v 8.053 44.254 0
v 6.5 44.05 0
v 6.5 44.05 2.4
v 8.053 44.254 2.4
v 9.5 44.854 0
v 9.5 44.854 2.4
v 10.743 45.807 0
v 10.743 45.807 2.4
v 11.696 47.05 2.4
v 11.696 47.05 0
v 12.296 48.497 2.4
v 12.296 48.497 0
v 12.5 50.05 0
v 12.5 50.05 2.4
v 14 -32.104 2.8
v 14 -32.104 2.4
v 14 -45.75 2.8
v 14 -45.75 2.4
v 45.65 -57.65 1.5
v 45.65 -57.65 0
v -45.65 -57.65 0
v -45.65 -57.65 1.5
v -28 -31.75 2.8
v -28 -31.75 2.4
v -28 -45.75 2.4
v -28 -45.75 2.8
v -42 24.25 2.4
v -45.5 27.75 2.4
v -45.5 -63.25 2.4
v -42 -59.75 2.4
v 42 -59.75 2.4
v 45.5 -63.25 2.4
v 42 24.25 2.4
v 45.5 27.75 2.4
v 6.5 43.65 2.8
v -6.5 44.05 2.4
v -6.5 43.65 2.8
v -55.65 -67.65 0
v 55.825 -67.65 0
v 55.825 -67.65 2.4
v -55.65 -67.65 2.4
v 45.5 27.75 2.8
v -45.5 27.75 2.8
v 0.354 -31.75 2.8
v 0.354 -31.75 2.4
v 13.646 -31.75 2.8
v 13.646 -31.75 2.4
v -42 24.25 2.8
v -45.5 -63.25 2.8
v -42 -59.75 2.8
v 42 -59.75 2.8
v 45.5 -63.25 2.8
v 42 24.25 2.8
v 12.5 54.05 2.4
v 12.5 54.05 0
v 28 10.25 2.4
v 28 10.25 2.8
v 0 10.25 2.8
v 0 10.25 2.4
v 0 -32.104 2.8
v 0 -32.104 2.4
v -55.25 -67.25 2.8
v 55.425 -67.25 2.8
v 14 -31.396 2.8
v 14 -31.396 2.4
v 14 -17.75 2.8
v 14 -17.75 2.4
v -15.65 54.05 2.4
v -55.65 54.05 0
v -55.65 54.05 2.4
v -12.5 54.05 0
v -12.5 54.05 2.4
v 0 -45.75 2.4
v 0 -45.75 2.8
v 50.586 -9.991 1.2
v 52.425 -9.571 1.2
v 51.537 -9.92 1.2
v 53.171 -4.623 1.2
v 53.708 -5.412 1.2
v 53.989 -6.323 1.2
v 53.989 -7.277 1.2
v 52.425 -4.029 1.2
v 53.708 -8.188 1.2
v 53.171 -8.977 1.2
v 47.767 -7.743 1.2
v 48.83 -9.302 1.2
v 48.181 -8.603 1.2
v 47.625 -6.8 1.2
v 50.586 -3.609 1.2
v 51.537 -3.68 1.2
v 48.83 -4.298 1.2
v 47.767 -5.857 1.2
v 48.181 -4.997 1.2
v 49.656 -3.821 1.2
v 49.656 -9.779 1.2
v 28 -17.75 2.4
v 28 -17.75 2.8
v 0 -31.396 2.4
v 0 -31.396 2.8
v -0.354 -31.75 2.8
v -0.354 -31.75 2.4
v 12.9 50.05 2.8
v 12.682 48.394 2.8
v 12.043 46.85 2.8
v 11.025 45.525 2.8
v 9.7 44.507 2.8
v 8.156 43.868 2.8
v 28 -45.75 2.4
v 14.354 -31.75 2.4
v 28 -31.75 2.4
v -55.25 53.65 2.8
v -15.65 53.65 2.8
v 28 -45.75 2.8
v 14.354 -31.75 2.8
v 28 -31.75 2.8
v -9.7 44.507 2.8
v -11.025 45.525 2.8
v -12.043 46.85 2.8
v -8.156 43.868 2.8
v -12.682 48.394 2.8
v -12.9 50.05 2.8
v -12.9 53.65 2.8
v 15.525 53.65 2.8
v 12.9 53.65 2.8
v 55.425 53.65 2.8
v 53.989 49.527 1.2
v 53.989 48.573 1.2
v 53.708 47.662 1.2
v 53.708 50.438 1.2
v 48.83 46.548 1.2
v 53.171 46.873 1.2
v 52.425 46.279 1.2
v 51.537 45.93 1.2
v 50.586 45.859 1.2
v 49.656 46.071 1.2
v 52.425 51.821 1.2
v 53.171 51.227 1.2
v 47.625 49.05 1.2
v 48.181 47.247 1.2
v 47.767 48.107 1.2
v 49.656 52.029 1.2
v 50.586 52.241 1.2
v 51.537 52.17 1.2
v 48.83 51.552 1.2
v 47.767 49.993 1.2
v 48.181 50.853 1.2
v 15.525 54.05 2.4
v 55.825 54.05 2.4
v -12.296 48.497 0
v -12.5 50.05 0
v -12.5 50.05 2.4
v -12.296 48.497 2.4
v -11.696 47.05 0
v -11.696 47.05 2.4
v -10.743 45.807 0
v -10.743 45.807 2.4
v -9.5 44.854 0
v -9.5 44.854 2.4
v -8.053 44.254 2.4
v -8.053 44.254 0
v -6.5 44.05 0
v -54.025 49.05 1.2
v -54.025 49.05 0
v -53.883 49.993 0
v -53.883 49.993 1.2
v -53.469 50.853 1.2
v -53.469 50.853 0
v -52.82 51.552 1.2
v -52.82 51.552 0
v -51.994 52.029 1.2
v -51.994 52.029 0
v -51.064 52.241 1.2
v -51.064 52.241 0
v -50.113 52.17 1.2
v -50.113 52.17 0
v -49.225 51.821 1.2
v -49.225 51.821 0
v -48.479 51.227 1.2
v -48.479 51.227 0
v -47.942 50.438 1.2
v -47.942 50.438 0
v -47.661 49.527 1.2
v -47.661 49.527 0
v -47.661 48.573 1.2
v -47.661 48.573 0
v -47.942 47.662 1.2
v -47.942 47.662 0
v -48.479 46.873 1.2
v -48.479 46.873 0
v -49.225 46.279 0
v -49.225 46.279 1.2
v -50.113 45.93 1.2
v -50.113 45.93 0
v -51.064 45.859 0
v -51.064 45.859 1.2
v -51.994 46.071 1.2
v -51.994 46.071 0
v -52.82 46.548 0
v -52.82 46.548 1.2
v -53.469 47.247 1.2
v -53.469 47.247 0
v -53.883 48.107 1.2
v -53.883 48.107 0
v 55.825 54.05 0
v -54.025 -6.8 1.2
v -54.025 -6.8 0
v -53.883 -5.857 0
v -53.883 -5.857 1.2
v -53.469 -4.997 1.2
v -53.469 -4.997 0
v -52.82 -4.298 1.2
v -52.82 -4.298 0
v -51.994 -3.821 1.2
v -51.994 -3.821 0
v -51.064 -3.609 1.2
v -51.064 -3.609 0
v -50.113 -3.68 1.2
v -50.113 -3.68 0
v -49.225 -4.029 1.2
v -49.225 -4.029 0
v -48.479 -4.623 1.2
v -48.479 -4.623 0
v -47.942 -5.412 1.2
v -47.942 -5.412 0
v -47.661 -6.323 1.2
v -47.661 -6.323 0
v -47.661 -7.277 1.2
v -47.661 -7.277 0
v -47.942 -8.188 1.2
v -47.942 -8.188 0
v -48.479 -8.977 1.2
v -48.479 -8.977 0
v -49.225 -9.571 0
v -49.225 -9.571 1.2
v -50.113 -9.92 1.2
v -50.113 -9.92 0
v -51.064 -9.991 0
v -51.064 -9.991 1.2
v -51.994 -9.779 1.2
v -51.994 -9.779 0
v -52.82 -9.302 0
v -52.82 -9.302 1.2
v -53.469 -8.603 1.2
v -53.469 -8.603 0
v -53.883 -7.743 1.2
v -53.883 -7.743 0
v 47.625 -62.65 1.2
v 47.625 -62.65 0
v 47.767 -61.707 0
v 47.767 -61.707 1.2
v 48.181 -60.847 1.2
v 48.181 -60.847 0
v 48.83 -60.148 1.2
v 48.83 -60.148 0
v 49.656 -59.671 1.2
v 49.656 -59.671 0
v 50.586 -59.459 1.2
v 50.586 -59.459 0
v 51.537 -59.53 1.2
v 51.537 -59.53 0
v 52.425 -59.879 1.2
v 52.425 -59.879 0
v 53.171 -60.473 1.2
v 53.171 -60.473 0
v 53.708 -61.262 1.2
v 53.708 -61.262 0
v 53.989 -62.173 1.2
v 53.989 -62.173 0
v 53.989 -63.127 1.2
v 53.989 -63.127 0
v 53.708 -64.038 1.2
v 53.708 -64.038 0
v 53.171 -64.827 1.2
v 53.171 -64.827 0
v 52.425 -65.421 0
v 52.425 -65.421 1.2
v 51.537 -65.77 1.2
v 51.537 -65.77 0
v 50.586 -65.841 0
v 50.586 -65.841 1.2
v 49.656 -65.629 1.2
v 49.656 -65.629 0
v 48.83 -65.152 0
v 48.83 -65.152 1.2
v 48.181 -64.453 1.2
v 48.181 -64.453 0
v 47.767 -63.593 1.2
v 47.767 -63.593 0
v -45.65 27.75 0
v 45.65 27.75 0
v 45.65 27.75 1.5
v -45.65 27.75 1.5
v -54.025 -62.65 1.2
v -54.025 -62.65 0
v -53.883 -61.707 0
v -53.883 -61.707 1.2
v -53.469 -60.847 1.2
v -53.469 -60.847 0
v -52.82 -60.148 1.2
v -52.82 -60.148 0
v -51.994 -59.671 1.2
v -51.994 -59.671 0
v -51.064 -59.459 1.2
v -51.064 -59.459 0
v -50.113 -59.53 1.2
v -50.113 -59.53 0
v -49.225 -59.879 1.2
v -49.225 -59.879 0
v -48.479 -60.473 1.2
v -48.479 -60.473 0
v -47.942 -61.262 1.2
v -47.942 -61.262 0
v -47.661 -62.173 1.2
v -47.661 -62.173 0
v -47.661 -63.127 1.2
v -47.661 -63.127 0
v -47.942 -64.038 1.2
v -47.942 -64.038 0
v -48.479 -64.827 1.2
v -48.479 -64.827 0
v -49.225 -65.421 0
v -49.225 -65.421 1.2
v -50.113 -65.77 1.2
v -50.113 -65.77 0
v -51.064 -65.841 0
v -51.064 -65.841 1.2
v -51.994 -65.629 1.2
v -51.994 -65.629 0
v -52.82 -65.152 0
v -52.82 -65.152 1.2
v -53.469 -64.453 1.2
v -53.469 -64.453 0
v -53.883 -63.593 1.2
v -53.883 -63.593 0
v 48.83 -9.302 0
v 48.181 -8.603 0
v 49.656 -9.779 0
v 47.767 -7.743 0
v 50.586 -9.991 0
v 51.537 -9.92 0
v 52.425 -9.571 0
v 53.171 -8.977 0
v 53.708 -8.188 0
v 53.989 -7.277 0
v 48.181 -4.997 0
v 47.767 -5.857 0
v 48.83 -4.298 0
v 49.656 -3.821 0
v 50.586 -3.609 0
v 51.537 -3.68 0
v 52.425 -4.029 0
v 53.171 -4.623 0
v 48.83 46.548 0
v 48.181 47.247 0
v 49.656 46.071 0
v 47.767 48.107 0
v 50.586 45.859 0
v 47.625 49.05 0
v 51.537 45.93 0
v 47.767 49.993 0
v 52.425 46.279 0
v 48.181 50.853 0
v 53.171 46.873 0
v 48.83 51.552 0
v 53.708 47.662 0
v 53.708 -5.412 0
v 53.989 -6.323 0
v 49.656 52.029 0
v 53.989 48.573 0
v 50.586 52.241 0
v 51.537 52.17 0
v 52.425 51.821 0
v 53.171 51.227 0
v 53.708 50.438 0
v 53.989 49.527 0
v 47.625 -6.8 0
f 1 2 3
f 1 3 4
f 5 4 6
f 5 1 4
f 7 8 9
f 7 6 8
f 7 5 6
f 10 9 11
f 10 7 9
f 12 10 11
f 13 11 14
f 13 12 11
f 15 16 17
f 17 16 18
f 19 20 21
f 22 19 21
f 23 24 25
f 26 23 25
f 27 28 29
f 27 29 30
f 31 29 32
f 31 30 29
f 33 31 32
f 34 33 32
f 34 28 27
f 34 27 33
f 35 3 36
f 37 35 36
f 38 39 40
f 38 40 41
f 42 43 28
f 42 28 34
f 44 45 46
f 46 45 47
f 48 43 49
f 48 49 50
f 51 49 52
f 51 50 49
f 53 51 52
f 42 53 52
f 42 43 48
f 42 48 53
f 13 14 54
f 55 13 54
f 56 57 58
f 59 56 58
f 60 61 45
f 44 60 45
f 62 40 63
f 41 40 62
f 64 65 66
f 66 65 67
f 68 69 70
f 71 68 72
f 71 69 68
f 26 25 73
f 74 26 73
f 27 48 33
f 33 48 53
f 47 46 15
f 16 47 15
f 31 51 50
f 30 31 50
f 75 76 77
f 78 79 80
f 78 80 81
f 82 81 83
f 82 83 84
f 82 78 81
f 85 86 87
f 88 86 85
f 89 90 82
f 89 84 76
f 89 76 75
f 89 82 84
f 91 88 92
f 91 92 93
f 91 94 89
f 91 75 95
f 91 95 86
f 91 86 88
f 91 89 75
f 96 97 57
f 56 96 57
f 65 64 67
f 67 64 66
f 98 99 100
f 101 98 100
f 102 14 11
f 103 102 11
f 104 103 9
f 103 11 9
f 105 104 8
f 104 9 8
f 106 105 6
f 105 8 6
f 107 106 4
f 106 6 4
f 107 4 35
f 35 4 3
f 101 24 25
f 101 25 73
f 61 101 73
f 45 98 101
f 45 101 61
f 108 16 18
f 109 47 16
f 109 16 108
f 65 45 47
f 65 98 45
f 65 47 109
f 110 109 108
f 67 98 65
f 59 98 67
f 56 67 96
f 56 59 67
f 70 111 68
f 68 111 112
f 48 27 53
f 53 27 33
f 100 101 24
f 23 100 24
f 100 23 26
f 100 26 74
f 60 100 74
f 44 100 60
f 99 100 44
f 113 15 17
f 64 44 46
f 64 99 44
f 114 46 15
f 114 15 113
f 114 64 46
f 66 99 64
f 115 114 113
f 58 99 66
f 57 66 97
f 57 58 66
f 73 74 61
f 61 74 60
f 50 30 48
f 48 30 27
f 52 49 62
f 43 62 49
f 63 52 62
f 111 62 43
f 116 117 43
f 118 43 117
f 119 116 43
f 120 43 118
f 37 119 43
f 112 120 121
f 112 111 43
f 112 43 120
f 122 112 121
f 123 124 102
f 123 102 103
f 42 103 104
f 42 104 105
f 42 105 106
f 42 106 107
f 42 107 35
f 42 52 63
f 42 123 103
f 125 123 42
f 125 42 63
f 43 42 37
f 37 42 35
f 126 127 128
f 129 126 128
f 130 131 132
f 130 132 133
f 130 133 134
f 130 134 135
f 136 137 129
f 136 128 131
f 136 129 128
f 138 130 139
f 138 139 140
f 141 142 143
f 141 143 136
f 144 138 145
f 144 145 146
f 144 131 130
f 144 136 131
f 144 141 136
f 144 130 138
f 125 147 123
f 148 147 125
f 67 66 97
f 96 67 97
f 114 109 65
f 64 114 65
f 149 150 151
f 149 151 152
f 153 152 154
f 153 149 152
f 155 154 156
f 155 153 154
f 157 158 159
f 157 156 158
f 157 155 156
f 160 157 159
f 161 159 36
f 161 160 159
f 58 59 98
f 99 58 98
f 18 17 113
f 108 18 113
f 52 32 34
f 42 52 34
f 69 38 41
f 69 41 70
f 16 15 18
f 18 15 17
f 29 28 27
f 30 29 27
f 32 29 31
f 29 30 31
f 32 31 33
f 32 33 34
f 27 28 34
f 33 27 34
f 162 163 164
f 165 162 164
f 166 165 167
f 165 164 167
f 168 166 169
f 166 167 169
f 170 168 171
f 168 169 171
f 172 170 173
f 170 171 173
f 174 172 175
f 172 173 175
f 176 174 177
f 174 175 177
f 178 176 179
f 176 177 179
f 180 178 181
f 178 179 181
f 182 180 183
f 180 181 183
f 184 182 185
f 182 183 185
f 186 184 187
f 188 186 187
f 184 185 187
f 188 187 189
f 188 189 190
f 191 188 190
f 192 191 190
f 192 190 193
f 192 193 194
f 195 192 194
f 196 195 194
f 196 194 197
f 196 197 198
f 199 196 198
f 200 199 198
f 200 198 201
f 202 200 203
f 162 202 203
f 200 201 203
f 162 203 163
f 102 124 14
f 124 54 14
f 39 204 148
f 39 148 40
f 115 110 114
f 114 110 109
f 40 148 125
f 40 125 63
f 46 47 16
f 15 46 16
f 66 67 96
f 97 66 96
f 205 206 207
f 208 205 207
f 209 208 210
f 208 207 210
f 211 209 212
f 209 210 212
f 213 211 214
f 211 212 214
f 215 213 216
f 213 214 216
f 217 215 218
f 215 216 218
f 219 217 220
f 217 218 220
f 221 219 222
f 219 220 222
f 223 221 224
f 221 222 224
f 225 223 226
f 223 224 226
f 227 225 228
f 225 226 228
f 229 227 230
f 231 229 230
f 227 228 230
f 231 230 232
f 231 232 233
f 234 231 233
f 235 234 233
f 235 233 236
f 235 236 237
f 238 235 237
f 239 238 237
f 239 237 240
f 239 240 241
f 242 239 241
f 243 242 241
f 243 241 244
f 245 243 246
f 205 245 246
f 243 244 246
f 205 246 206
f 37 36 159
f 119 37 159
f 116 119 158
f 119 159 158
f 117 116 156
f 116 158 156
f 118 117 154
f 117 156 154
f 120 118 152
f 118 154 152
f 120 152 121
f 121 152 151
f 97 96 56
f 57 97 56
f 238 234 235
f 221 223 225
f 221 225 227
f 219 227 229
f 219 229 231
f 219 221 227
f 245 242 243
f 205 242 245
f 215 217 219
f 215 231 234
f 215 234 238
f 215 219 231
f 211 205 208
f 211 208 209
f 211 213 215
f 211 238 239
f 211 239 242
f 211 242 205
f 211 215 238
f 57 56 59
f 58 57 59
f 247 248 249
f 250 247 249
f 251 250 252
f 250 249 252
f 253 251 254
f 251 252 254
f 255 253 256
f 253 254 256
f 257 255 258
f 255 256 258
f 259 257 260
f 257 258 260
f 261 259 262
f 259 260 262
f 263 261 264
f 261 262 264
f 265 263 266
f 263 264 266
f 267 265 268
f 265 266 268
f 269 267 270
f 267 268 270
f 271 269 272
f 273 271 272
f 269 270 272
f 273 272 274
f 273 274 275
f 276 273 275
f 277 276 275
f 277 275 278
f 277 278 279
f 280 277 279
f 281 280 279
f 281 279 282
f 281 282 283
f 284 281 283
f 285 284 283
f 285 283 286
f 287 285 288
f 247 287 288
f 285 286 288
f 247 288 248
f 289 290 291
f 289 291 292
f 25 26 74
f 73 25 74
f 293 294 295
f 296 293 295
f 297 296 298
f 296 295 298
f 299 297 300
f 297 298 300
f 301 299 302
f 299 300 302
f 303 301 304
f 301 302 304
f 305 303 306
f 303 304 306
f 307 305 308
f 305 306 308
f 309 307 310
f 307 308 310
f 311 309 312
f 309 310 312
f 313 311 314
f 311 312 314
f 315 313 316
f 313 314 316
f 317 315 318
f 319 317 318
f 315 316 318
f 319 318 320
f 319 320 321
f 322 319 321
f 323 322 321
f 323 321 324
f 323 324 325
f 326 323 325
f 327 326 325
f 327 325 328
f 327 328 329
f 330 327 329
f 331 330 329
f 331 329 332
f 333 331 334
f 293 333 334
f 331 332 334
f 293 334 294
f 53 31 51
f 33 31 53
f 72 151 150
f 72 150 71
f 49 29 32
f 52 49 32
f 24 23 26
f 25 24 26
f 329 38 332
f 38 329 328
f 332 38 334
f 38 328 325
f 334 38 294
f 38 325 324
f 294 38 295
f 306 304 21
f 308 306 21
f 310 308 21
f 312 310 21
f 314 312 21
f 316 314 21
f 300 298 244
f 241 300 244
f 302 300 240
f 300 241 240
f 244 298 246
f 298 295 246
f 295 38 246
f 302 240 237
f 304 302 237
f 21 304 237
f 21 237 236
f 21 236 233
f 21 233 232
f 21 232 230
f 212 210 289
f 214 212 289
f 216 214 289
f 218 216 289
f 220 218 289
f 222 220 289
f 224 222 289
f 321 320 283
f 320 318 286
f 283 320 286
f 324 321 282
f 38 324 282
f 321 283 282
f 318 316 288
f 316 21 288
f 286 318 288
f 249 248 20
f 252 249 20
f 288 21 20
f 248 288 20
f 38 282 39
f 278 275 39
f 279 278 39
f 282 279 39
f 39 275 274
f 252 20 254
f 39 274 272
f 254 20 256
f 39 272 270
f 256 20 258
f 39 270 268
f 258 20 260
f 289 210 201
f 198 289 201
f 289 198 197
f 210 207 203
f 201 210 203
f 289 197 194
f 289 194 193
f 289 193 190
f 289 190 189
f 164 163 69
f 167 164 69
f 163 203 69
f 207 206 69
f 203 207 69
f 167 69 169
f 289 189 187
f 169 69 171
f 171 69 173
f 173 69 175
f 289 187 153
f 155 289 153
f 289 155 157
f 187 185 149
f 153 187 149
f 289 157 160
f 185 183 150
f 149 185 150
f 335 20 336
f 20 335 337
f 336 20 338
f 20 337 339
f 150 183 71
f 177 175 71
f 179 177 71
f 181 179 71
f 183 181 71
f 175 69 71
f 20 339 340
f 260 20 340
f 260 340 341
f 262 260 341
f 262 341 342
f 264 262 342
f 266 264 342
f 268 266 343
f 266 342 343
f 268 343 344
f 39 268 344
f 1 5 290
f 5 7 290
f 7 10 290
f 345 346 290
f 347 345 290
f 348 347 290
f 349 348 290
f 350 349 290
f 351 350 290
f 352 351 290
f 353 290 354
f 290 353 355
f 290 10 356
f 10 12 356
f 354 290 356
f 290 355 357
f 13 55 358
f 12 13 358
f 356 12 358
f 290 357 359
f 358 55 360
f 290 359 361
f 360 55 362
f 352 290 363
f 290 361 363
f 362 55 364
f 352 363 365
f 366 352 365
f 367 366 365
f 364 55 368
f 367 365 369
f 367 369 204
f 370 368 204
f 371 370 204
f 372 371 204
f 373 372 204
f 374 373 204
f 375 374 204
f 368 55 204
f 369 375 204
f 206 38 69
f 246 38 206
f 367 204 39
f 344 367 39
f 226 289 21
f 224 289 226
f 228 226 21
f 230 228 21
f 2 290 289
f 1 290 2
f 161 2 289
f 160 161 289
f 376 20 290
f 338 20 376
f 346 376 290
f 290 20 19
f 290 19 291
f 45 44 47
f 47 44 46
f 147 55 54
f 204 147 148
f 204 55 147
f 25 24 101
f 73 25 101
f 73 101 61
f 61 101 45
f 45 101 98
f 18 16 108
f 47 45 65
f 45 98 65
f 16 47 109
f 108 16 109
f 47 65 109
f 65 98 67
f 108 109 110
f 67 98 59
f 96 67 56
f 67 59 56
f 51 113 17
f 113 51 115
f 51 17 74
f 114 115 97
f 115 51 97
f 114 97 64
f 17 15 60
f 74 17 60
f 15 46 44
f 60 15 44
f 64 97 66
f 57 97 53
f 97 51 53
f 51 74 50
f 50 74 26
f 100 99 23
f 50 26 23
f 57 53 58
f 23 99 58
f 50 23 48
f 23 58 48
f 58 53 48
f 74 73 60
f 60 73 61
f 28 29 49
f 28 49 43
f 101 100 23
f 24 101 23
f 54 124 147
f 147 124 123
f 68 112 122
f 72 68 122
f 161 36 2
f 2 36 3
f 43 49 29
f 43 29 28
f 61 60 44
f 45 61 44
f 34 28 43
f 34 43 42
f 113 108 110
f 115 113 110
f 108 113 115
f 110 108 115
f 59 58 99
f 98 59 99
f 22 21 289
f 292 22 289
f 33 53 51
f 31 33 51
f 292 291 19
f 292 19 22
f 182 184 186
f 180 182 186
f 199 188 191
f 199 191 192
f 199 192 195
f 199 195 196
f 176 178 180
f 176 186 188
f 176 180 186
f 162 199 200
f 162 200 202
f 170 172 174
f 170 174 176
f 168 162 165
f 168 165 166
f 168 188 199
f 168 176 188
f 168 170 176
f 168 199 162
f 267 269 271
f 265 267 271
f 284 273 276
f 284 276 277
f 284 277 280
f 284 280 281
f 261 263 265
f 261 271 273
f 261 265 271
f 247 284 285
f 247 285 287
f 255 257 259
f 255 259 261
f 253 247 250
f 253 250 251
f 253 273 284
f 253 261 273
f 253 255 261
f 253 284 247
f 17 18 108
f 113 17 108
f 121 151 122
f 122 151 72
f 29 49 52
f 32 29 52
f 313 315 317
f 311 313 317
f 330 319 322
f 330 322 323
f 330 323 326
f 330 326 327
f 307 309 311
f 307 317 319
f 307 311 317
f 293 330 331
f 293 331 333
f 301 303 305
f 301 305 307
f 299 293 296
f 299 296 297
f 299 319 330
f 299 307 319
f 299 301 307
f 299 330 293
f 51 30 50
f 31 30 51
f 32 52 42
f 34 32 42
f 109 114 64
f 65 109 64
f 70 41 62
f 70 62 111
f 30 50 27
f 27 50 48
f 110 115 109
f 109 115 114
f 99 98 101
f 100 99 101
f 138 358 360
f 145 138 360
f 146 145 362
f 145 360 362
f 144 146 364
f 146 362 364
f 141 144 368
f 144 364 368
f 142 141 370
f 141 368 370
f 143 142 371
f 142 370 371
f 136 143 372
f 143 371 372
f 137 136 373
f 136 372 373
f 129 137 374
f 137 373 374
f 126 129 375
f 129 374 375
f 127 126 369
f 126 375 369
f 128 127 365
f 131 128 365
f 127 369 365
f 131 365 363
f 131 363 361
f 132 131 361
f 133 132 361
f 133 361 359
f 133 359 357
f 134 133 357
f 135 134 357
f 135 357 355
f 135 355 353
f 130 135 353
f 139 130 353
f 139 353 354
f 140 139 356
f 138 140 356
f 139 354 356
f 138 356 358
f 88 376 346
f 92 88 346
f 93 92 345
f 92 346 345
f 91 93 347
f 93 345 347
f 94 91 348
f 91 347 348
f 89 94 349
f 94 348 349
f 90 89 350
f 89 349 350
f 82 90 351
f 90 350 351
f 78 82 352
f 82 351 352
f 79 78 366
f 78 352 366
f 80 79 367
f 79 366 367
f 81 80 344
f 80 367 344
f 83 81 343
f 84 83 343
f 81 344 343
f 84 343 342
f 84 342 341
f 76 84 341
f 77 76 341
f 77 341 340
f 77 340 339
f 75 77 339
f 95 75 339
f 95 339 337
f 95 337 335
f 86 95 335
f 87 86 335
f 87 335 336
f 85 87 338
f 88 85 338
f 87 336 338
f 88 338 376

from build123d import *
from build123d.topology import SkipClean

# Parameters (mm, degrees)
SKETCH1_R           = 1.35
BOSS_EXTRUDE1_DEPTH = 2.8
SKETCH3_R           = 2.5
CUT_EXTRUDE1_DEPTH  = 2.2
SKETCH4_W           = 91.3
SKETCH4_H           = 85.4
CUT_EXTRUDE2_DEPTH  = 1.5
CUT_EXTRUDE3_DEPTH  = 0.2
SKETCH6_W           = 2.7
SKETCH6_H           = 2.7
CUT_EXTRUDE4_DEPTH  = 0.2
CHAMFER1_SIZE       = 0.4
SKETCH7_W           = 91
SKETCH7_H           = 91
CUT_EXTRUDE5_DEPTH  = 0.4
SKETCH8_W           = 91
SKETCH8_H           = 91
SKETCH8_W_2         = 84
SKETCH8_H_2         = 84
BOSS_EXTRUDE2_DEPTH = 0.4
CUT_EXTRUDE6_DEPTH  = 0.4
BOSS_EXTRUDE3_DEPTH = 0.4
BOSS_EXTRUDE4_START = -2.8
SKETCH11_W          = 31.175
SKETCH11_H          = 25.7
BOSS_EXTRUDE4_DEPTH = 2.8
CHAMFER2_SIZE       = 0.4
SKETCH12_R          = 2.5
BOSS_EXTRUDE5_DEPTH = 2.8
SKETCH13_R          = 3.2
CUT_EXTRUDE7_DEPTH  = 1.2
SKETCH14_W          = 25
SKETCH14_H          = 10
CUT_EXTRUDE8_DEPTH  = 88.754163007
FILLET1_R           = 6
CHAMFER3_SIZE       = 0.4


with BuildPart() as part:
    # Sketch1 → Boss-Extrude1 (new body)
    with BuildSketch(Plane.XY):
        Polygon((-15.25, 54.05), (-15.25, 28.75), (15.125, 28.75), (15.125, 54.05), (55.825, 54.05), (55.825, -67.65), (-55.65, -67.65), (-55.65, 54.05), align=None)
        with Locations((-52, 50)):
            Circle(SKETCH1_R, mode=Mode.SUBTRACT)
        with Locations((-52, 2.9)):
            Circle(SKETCH1_R, mode=Mode.SUBTRACT)
        with Locations((-52, -64)):
            Circle(SKETCH1_R, mode=Mode.SUBTRACT)
        with Locations((52, 50)):
            Circle(SKETCH1_R, mode=Mode.SUBTRACT)
        with Locations((52, 2.9)):
            Circle(SKETCH1_R, mode=Mode.SUBTRACT)
        with Locations((52, -64)):
            Circle(SKETCH1_R, mode=Mode.SUBTRACT)
    extrude(amount=BOSS_EXTRUDE1_DEPTH)

    # Sketch3 → Cut-Extrude1 (cut)
    with BuildSketch(Plane.XY.offset(2.8)):
        with Locations((-52, 50)):
            Circle(SKETCH3_R)
        with Locations((-52, 2.9)):
            Circle(SKETCH3_R)
        with Locations((-52, -64)):
            Circle(SKETCH3_R)
        with Locations((52, -64)):
            Circle(SKETCH3_R)
        with Locations((52, 2.9)):
            Circle(SKETCH3_R)
        with Locations((52, 50)):
            Circle(SKETCH3_R)
    extrude(amount=-CUT_EXTRUDE1_DEPTH, mode=Mode.SUBTRACT)

    # Sketch4 → Cut-Extrude2 (cut)
    with BuildSketch(Plane(origin=(0, 0, 0), x_dir=(-1, 0, 0), z_dir=(0, 0, -1))):
        with Locations((0, -14.95)):
            Rectangle(SKETCH4_W, SKETCH4_H)
    extrude(amount=-CUT_EXTRUDE2_DEPTH, mode=Mode.SUBTRACT)

    # Sketch5 → Cut-Extrude3 (cut)
    with SkipClean():  # the faces are left unmerged after this step: merging them gives an invalid solid
        with BuildSketch(Plane.XY.offset(0.6)):
            with BuildLine():
                Line((-53.35, 47.895837459), (-53.35, 52.104162541))
                ThreePointArc((-53.35, 52.104162541), (-52, 52.5), (-50.65, 52.104162541))
                Line((-50.65, 52.104162541), (-50.65, 47.895837459))
                ThreePointArc((-50.65, 47.895837459), (-52, 47.5), (-53.35, 47.895837459))
            make_face()
            with BuildLine():
                Line((-53.35, 0.795837459), (-53.35, 5.004162541))
                ThreePointArc((-53.35, 5.004162541), (-52, 5.4), (-50.65, 5.004162541))
                Line((-50.65, 5.004162541), (-50.65, 0.795837459))
                ThreePointArc((-50.65, 0.795837459), (-52, 0.4), (-53.35, 0.795837459))
            make_face()
            with BuildLine():
                Line((-53.35, -66.104162541), (-53.35, -61.895837459))
                ThreePointArc((-53.35, -61.895837459), (-52, -61.5), (-50.65, -61.895837459))
                Line((-50.65, -61.895837459), (-50.65, -66.104162541))
                ThreePointArc((-50.65, -66.104162541), (-52, -66.5), (-53.35, -66.104162541))
            make_face()
        cut_extrude3 = extrude(amount=-CUT_EXTRUDE3_DEPTH, mode=Mode.SUBTRACT)

    # Sketch6 → Cut-Extrude4 (cut)
    with SkipClean():  # the faces are left unmerged after this step: merging them gives an invalid solid
        with BuildSketch(Plane.XY.offset(0.4)):
            with Locations((-52, -64)):
                Rectangle(SKETCH6_W, SKETCH6_H)
            with Locations((-52, 2.9)):
                Rectangle(SKETCH6_W, SKETCH6_H)
            with Locations((-52, 50)):
                Rectangle(SKETCH6_W, SKETCH6_H)
        cut_extrude4 = extrude(amount=-CUT_EXTRUDE4_DEPTH, mode=Mode.SUBTRACT)

    # Mirror1: Cut-Extrude3, Cut-Extrude4 across plane
    with SkipClean():  # the faces are left unmerged after this step: merging them gives an invalid solid
        add(cut_extrude3.mirror(Plane(origin=(0, 0, 0), x_dir=(0, 0, 1), z_dir=(1, 0, 0))), mode=Mode.SUBTRACT)
        add(cut_extrude4.mirror(Plane(origin=(0, 0, 0), x_dir=(0, 0, 1), z_dir=(1, 0, 0))), mode=Mode.SUBTRACT)

    # Chamfer1
    chamfer1_edges = [part.edges().sort_by_distance(p)[0] for p in [
        (55.825, -6.8, 2.8),
        (35.475, 54.05, 2.8),
        (15.125, 41.4, 2.8),
        (-0.0625, 28.75, 2.8),
        (-15.25, 41.4, 2.8),
        (-35.45, 54.05, 2.8),
        (-55.65, -6.8, 2.8),
        (0.0875, -67.65, 2.8),
    ]]
    chamfer(chamfer1_edges, length=CHAMFER1_SIZE)

    # Sketch7 → Cut-Extrude5 (cut)
    with SkipClean():  # the faces are left unmerged after this step: merging them gives an invalid solid
        with BuildSketch(Plane.XY.offset(2.8)):
            with Locations((0, -17.75)):
                Rectangle(SKETCH7_W, SKETCH7_H)
            Polygon((28, 24.25), (42, 24.25), (42, 10.25), (42, -3.75), (42, -17.75), (42, -31.75), (42, -45.75), (42, -59.75), (28, -59.75), (14, -59.75), (0, -59.75), (-14, -59.75), (-28, -59.75), (-42, -59.75), (-42, -45.75), (-42, -31.75), (-42, -17.75), (-42, -3.75), (-42, 10.25), (-42, 24.25), (-28, 24.25), (-14, 24.25), (0, 24.25), (14, 24.25), align=None, mode=Mode.SUBTRACT)
        extrude(amount=-CUT_EXTRUDE5_DEPTH, mode=Mode.SUBTRACT)

    # Sketch9 → Cut-Extrude6 (cut)
    with SkipClean():  # the faces are left unmerged after this step: merging them gives an invalid solid
        with BuildSketch(Plane.XY.offset(2.8)):
            Polygon((-28, -31.75), (-28, -45.75), (-14, -45.75), (0, -45.75), (0, -32.103553391), (0.353553391, -31.75), (13.646446609, -31.75), (14, -32.103553391), (14, -45.75), (28, -45.75), (28, -31.75), (14.353553391, -31.75), (14, -31.396446609), (14, -17.75), (28, -17.75), (28, -3.75), (28, 10.25), (14, 10.25), (0, 10.25), (0, -3.75), (0, -17.75), (0, -31.396446609), (-0.353553391, -31.75), (-14, -31.75), align=None)
        extrude(amount=-CUT_EXTRUDE6_DEPTH, mode=Mode.SUBTRACT)

    # Sketch11 → Boss-Extrude4 (add)
    with SkipClean():  # the faces are left unmerged after this step: merging them gives an invalid solid
        with BuildSketch(Plane.XY.offset(2.8).offset(BOSS_EXTRUDE4_START)):
            with Locations((-0.0625, 41.2)):
                Rectangle(SKETCH11_W, SKETCH11_H)
        extrude(amount=BOSS_EXTRUDE4_DEPTH)

    # Chamfer2
    chamfer2_edges = [part.edges().sort_by_distance(p)[0] for p in [
        (-0.0625, 54.05, 2.8),
    ]]
    chamfer(chamfer2_edges, length=CHAMFER2_SIZE - 0.0001)  # a hair under: the kernel refuses the full size

    # Sketch12 → Boss-Extrude5 (add)
    with BuildSketch(Plane.XY.offset(2.8)):
        with Locations((52, -64)):
            Circle(SKETCH12_R)
        with Locations((52, 50)):
            Circle(SKETCH12_R)
        with Locations((52, 2.9)):
            Circle(SKETCH12_R)
        with Locations((-52, -64)):
            Circle(SKETCH12_R)
        with Locations((-52, 2.9)):
            Circle(SKETCH12_R)
        with Locations((-52, 50)):
            Circle(SKETCH12_R)
    extrude(amount=-BOSS_EXTRUDE5_DEPTH)

    # Sketch13 → Cut-Extrude7 (cut)
    with BuildSketch(Plane(origin=(0, 0, 0), x_dir=(-1, 0, 0), z_dir=(0, 0, -1))):
        with Locations((-50.825, 49.05)):
            Circle(SKETCH13_R)
        with Locations((50.825, 49.05)):
            Circle(SKETCH13_R)
        with Locations((50.825, -62.65)):
            Circle(SKETCH13_R)
        with Locations((-50.825, -62.65)):
            Circle(SKETCH13_R)
        with Locations((-50.825, -6.8)):
            Circle(SKETCH13_R)
        with Locations((50.825, -6.8)):
            Circle(SKETCH13_R)
    extrude(amount=-CUT_EXTRUDE7_DEPTH, mode=Mode.SUBTRACT)

    # Sketch14 → Cut-Extrude8 (cut, through all)
    with BuildSketch(Plane.XY.offset(2.8)):
        with Locations((0, 49.05)):
            Rectangle(SKETCH14_W, SKETCH14_H)
    extrude(amount=-CUT_EXTRUDE8_DEPTH, mode=Mode.SUBTRACT)

    # Fillet1
    fillet1_edges = [part.edges().sort_by_distance(p)[0] for p in [
        (-12.5, 44.05, 1.4),
        (12.5, 44.05, 1.4),
    ]]
    fillet(fillet1_edges, radius=FILLET1_R)

    # Chamfer3
    chamfer3_edges = [part.edges().sort_by_distance(p)[0] for p in [
        (-12.5, 51.85005, 2.8),
        (12.5, 51.85005, 2.8),
        (0, 44.05, 2.8),
        (10.742640687, 45.807359313, 2.8),
        (-10.742640687, 45.807359313, 2.8),
    ]]
    chamfer(chamfer3_edges, length=CHAMFER3_SIZE)


with BuildPart() as body_2:
    # Sketch8 → Boss-Extrude2 (new body)
    with BuildSketch(Plane.XY.offset(2.4)):
        with Locations((0, -17.75)):
            Rectangle(SKETCH8_W, SKETCH8_H)
        with Locations((0, -17.75)):
            Rectangle(SKETCH8_W_2, SKETCH8_H_2, mode=Mode.SUBTRACT)
    extrude(amount=BOSS_EXTRUDE2_DEPTH)


with BuildPart() as body_3:
    # Sketch10 → Boss-Extrude3 (new body)
    with BuildSketch(Plane.XY.offset(2.4)):
        Polygon((28, -31.75), (14.353553391, -31.75), (14, -31.396446609), (14, -17.75), (28, -17.75), (28, 10.25), (0, 10.25), (0, -31.396446609), (-0.353553391, -31.75), (-28, -31.75), (-28, -45.75), (0, -45.75), (0, -32.103553391), (0.353553391, -31.75), (13.646446609, -31.75), (14, -32.103553391), (14, -45.75), (28, -45.75), align=None)
    extrude(amount=BOSS_EXTRUDE3_DEPTH)


solid = Compound([part.part, body_2.part, body_3.part])
